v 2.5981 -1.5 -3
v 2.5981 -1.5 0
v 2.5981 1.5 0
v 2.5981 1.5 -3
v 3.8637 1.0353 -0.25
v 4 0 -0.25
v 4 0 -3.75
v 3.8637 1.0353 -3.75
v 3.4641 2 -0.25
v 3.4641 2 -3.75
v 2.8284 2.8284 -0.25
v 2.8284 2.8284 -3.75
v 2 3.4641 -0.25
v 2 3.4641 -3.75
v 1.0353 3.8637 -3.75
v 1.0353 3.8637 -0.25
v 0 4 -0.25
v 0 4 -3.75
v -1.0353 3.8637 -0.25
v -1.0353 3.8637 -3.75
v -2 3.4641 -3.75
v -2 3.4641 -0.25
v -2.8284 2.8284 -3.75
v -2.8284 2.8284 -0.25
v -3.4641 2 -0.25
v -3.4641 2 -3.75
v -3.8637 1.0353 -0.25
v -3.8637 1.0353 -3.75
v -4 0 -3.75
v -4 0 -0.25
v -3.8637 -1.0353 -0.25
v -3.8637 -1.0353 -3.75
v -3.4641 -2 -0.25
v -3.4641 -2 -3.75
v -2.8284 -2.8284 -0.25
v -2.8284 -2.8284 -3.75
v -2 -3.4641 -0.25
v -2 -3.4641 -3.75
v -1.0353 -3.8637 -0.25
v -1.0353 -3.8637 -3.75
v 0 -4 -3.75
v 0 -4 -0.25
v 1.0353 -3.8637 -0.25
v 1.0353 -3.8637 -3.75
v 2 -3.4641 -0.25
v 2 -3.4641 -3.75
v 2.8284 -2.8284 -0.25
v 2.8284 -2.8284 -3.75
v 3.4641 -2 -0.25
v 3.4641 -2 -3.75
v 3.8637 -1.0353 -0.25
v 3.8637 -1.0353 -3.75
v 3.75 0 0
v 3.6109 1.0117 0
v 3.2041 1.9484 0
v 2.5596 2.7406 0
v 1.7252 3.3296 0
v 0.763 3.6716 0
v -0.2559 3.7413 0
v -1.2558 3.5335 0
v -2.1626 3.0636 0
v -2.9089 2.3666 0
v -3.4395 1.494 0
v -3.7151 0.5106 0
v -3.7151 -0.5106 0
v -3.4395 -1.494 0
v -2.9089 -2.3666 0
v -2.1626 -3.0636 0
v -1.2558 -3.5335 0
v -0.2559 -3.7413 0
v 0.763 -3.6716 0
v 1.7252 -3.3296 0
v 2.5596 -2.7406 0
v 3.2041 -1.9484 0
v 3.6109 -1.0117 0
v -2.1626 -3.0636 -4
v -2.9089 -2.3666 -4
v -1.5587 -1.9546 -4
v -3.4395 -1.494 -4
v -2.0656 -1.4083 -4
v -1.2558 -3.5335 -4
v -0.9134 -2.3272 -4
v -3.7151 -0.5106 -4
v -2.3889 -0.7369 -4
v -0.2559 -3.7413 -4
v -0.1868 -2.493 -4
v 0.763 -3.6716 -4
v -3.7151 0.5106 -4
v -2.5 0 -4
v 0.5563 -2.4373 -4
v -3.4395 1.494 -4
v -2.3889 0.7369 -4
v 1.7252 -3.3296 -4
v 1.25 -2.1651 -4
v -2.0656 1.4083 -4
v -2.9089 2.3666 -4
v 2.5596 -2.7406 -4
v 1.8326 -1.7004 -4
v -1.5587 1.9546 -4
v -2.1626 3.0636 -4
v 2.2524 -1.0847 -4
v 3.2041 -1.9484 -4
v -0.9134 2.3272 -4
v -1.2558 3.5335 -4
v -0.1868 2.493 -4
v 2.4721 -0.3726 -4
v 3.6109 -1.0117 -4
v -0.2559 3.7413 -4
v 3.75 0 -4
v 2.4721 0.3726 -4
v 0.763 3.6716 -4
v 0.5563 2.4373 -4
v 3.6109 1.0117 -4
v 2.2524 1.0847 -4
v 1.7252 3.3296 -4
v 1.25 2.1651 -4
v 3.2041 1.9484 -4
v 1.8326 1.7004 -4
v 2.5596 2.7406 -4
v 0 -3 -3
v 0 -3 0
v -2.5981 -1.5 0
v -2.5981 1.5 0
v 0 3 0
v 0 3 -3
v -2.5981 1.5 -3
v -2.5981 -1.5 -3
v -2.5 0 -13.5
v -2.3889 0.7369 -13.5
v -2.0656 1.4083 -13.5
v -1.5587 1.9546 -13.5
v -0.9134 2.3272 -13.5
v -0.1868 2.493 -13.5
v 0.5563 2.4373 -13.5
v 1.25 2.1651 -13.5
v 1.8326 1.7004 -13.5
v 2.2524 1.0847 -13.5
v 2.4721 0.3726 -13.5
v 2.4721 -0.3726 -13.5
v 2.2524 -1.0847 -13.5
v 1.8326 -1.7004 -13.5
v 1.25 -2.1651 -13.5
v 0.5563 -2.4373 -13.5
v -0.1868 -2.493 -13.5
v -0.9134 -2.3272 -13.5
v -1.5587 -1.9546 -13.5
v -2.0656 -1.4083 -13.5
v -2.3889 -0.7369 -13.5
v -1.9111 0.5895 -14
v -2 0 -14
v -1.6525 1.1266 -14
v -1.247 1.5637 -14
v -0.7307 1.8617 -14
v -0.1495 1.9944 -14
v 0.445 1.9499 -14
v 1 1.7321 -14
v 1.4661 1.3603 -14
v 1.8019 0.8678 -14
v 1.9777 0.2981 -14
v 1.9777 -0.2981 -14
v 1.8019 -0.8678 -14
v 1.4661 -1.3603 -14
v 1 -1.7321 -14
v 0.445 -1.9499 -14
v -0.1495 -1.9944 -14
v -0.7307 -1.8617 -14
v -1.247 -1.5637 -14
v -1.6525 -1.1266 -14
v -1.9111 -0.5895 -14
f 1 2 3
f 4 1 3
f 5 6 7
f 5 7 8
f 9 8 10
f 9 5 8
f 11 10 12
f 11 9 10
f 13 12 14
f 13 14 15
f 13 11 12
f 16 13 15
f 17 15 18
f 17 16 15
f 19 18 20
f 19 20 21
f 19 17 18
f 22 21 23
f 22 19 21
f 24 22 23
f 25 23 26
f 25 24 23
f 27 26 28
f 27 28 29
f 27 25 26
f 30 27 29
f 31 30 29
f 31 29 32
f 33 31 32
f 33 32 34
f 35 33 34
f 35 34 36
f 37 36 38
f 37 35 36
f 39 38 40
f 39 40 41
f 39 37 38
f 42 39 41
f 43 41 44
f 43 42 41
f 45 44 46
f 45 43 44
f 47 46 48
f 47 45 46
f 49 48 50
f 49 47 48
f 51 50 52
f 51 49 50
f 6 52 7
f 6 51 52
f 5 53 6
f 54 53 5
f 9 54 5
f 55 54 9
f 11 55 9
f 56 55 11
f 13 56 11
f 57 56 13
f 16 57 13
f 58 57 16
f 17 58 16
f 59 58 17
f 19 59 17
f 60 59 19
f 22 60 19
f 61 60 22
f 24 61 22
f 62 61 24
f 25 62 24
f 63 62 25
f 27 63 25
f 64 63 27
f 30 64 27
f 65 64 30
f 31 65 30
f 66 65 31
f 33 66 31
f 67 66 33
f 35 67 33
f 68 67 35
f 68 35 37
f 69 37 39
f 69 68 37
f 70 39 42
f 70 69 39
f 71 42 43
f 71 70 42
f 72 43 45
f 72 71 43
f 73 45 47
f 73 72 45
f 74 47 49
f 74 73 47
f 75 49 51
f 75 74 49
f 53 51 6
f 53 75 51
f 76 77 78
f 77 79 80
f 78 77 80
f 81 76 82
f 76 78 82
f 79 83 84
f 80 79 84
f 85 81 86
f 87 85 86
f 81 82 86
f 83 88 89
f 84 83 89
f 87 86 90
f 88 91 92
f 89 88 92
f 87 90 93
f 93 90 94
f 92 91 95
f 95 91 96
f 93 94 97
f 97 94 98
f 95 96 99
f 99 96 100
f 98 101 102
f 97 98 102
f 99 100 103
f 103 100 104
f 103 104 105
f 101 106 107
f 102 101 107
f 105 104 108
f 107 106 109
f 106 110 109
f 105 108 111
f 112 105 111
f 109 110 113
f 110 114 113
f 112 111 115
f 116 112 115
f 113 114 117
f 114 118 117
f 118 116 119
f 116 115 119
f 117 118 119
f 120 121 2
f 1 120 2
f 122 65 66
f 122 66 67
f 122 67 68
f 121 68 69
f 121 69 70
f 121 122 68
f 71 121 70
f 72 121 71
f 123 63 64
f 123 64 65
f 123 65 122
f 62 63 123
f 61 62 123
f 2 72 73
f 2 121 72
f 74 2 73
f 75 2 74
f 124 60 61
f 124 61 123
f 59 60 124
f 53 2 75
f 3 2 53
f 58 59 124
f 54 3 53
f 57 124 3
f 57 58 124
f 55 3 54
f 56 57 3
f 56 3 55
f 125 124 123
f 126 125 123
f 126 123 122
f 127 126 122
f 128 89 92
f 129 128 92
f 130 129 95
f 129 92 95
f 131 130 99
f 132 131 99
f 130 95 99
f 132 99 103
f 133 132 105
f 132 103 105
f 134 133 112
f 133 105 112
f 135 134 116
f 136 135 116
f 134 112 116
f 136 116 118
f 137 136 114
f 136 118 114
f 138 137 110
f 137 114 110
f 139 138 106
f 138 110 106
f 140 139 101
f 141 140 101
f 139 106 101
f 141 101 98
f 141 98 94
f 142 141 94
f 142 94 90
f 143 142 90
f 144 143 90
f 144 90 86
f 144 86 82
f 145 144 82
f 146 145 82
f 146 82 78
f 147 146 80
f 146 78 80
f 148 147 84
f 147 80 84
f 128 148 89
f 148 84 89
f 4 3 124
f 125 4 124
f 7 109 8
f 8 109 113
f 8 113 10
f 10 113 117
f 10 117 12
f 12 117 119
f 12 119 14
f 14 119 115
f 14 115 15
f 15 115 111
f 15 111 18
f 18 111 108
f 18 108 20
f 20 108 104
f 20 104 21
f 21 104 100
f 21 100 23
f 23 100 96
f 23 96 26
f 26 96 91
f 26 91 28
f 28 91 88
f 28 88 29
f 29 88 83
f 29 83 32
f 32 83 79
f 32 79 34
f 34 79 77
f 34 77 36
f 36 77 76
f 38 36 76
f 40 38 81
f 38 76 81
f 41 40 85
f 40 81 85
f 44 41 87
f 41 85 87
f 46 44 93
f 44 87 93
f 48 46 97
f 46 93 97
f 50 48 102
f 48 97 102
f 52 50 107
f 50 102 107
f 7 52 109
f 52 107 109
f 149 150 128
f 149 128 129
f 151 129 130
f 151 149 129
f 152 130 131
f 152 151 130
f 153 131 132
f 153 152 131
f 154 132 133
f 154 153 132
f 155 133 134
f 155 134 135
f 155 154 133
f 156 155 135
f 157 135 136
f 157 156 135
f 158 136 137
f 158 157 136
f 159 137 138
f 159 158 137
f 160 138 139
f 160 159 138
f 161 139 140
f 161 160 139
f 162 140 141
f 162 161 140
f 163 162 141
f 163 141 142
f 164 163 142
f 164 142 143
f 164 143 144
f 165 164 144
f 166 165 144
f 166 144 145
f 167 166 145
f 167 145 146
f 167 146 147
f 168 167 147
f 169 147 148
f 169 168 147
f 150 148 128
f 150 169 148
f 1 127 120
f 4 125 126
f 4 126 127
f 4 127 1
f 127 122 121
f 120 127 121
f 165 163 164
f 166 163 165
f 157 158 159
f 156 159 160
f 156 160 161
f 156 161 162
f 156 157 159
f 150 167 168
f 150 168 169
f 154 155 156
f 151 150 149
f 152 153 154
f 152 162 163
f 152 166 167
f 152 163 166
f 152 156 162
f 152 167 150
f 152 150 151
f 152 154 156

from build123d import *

# Parameters (mm, degrees)
SKETCH1_R           = 4
BOSS_EXTRUDE1_DEPTH = 4
CHAMFER1_SIZE       = 0.25
CUT_EXTRUDE1_DEPTH  = 3
SKETCH3_R           = 2.5
BOSS_EXTRUDE2_DEPTH = 10
CHAMFER2_SIZE       = 0.5


with BuildPart() as part:
    # Sketch1 → Boss-Extrude1 (new body)
    with BuildSketch(Plane(origin=(0, 0, 0), x_dir=(0, 1, 0), z_dir=(0, 0, 1))):
        with Locations(Location((0, 0, 0), (0, 0, 270))):
            Circle(SKETCH1_R)
    extrude(amount=-BOSS_EXTRUDE1_DEPTH)

    # Chamfer1
    chamfer1_edges = [part.edges().sort_by_distance(p)[0] for p in [
        (-4, 0, 0),
        (-4, 0, -4),
    ]]
    chamfer(chamfer1_edges, length=CHAMFER1_SIZE)

    # Sketch2 → Cut-Extrude1 (cut)
    with BuildSketch(Plane.XY):
        Polygon((0, 3), (-2.598076211, 1.5), (-2.598076211, -1.5), (0, -3), (2.598076211, -1.5), (2.598076211, 1.5), align=None)
    extrude(amount=-CUT_EXTRUDE1_DEPTH, mode=Mode.SUBTRACT)

    # Sketch3 → Boss-Extrude2 (add)
    with BuildSketch(Plane(origin=(0, 0, -4), x_dir=(1, 0, 0), z_dir=(0, 0, -1))):
        with Locations(Location((0, 0, 0), (0, 0, 180))):
            Circle(SKETCH3_R)
    extrude(amount=BOSS_EXTRUDE2_DEPTH)

    # Chamfer2
    chamfer2_edges = [part.edges().sort_by_distance(p)[0] for p in [
        (2.5, 0, -14),
    ]]
    chamfer(chamfer2_edges, length=CHAMFER2_SIZE)


solid = part.part
